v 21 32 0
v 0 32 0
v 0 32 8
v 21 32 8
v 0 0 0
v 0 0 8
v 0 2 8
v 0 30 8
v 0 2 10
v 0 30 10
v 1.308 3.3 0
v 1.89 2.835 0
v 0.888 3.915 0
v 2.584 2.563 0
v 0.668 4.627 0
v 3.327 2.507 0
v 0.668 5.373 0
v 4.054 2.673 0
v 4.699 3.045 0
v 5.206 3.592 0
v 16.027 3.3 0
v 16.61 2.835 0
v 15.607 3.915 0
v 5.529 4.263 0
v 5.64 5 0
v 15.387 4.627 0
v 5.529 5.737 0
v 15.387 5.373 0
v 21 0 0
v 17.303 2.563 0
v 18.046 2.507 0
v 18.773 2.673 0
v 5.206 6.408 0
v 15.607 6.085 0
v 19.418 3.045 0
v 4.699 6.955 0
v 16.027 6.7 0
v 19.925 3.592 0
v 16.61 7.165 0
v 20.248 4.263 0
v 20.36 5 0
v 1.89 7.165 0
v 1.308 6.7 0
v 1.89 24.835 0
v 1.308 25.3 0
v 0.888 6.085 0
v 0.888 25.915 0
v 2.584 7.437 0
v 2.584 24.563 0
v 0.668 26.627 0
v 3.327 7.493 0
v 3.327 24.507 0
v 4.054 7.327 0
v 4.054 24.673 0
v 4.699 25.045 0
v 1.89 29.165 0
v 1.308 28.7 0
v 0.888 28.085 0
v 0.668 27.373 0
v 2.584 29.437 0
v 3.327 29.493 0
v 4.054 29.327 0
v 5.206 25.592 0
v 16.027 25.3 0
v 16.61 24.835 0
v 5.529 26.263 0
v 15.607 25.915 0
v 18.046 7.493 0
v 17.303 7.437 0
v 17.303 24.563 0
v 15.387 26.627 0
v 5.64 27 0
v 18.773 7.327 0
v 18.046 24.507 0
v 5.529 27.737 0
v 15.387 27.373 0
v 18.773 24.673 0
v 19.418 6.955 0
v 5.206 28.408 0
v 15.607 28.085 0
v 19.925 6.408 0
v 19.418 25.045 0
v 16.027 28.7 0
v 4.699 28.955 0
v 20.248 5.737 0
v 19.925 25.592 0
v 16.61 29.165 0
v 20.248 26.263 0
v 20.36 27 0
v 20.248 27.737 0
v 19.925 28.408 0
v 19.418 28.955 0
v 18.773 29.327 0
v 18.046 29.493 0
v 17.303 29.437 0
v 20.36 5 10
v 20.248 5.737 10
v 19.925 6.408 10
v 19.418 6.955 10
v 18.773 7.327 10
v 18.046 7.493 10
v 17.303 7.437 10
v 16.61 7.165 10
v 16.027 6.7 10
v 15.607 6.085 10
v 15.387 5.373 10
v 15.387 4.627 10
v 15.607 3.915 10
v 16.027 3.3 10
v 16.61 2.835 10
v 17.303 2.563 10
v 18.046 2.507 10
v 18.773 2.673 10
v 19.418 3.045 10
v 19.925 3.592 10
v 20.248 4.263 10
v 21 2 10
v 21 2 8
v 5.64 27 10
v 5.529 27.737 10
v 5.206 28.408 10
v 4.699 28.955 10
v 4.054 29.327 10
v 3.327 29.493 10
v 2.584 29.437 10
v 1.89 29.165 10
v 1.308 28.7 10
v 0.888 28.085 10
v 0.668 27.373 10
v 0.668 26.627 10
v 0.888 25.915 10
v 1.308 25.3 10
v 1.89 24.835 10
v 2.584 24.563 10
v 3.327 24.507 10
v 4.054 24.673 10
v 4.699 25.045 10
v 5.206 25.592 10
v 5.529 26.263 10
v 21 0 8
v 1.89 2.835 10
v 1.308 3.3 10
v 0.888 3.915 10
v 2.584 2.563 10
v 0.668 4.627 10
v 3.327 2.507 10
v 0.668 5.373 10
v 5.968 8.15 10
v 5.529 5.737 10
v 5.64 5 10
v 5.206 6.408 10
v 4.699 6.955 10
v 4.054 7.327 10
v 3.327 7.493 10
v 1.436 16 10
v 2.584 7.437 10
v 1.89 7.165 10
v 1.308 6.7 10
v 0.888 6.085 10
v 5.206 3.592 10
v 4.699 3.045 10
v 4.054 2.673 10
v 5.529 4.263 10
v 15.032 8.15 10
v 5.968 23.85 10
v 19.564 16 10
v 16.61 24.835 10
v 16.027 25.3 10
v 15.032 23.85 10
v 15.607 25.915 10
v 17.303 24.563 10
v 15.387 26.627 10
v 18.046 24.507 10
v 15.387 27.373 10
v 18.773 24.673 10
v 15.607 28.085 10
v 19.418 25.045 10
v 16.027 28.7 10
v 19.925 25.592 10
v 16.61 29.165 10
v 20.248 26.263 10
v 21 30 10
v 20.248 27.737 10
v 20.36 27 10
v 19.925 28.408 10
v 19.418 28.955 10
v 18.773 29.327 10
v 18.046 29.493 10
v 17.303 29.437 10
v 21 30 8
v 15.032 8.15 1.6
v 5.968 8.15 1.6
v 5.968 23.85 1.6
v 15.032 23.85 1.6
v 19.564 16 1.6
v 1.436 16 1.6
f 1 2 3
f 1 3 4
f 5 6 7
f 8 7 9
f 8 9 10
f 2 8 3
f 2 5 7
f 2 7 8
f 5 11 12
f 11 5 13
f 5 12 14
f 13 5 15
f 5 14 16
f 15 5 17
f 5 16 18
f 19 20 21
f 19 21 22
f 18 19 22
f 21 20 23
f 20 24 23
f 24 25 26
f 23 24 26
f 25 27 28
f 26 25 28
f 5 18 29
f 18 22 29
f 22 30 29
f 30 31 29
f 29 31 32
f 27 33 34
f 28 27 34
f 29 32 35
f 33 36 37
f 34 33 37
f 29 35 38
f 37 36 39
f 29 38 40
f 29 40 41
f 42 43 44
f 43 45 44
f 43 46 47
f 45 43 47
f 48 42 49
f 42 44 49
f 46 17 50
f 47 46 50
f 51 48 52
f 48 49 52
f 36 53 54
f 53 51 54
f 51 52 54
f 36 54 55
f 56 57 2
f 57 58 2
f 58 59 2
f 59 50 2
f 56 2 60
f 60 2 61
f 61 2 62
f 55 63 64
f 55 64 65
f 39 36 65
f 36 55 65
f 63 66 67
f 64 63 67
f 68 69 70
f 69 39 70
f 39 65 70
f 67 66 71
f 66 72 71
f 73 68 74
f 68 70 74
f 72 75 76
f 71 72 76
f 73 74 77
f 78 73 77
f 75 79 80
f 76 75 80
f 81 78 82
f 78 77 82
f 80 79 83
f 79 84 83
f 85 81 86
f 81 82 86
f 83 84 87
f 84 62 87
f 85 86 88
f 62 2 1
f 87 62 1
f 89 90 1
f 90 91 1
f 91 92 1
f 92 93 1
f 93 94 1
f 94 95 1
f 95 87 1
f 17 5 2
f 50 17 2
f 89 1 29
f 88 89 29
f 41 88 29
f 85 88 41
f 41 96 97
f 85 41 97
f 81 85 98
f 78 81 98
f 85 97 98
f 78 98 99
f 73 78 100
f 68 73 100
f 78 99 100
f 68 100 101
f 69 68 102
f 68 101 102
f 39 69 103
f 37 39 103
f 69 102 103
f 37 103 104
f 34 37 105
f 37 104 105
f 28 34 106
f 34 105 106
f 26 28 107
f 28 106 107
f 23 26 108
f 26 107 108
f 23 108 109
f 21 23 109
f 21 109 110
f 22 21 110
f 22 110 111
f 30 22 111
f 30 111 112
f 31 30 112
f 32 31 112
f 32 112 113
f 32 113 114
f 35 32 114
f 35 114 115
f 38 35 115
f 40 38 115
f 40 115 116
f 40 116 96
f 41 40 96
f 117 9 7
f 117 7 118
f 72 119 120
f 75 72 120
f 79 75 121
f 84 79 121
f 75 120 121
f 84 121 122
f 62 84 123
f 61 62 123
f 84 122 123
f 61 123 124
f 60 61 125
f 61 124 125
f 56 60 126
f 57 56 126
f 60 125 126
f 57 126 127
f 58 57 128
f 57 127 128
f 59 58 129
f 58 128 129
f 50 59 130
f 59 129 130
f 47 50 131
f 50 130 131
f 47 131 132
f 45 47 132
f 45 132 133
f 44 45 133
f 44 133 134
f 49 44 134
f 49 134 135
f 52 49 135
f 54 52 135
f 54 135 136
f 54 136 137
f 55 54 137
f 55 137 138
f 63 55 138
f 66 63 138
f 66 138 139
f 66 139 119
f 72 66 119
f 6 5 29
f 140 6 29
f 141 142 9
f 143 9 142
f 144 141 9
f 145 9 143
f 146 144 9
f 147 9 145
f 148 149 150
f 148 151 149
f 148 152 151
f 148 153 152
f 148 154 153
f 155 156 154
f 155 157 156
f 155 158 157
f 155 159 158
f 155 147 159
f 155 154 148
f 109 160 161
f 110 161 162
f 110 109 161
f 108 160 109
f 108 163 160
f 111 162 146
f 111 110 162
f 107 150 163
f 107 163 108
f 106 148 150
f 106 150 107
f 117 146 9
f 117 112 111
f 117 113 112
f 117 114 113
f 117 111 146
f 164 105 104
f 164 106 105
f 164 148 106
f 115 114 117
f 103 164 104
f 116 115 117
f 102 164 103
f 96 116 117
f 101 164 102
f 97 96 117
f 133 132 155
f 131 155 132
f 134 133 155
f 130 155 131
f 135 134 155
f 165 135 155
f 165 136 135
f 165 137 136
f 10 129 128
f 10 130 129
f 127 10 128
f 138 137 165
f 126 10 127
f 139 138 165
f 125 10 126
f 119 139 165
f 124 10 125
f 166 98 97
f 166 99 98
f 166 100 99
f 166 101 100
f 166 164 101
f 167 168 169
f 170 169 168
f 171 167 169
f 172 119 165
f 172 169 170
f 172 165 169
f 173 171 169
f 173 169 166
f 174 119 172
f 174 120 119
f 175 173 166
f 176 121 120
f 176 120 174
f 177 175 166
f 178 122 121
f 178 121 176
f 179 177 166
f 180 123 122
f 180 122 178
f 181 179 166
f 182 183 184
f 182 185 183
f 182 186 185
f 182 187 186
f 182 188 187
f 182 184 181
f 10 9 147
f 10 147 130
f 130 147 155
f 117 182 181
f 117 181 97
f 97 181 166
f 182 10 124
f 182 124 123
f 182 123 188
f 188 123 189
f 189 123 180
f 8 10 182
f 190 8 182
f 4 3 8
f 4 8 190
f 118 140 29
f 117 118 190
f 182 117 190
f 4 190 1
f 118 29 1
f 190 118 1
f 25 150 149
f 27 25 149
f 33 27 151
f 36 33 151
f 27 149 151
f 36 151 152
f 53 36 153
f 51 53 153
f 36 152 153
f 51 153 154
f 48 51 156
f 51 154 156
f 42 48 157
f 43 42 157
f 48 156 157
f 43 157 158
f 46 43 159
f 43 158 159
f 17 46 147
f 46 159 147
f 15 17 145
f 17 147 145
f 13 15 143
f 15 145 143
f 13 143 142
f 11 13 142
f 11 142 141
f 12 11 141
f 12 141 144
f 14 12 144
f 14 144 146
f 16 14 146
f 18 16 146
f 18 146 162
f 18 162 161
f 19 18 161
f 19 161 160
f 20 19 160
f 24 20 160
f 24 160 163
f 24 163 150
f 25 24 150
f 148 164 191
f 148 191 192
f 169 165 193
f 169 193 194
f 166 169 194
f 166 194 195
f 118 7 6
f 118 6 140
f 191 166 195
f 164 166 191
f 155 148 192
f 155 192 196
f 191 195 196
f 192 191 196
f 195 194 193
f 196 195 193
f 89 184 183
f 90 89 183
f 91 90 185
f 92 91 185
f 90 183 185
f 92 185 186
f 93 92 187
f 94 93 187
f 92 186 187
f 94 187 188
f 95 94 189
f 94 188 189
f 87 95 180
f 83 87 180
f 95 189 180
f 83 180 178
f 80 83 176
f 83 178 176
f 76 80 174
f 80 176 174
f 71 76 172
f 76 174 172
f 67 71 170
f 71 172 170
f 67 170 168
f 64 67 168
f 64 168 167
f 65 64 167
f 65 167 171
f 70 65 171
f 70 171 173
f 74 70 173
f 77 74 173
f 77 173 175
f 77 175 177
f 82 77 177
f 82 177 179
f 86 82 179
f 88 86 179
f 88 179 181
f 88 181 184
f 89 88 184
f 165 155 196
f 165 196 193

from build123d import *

# Parameters (mm, degrees)
BOX_W           = 21
BOX_H           = 32
BOX_DEPTH       = 10
POCKET_DEPTH    = 8.4
SKETCH002_W     = 21
SKETCH002_H     = 2
POCKET001_DEPTH = 2
SKETCH001_R     = 2.5
POCKET002_DEPTH = 10.001


with BuildPart() as part:
    # Box → Box (new body)
    with BuildSketch(Plane.XY):
        with Locations((10.5, 16)):
            Rectangle(BOX_W, BOX_H)
    extrude(amount=BOX_DEPTH)

    # Sketch → Pocket (cut)
    with BuildSketch(Plane.XY.offset(10)):
        Polygon((1.435601, 16), (5.9678, 23.850001), (15.0322, 23.850001), (19.564399, 16), (15.0322, 8.149999), (5.9678, 8.149999), align=None)
    extrude(amount=-POCKET_DEPTH, mode=Mode.SUBTRACT)

    # Sketch002 → Pocket001 (cut)
    with BuildSketch(Plane.XY.offset(10)):
        with Locations((10.5, 31)):
            Rectangle(SKETCH002_W, SKETCH002_H)
        with Locations((10.5, 1)):
            Rectangle(SKETCH002_W, SKETCH002_H)
    extrude(amount=-POCKET001_DEPTH, mode=Mode.SUBTRACT)

    # Sketch001 → Pocket002 (cut, through all)
    with BuildSketch(Plane.XY.offset(10)):
        with Locations((3.140495, 27)):
            Circle(SKETCH001_R)
        with Locations((17.859505, 27)):
            Circle(SKETCH001_R)
        with Locations((3.140495, 5)):
            Circle(SKETCH001_R)
        with Locations((17.859505, 5)):
            Circle(SKETCH001_R)
    extrude(amount=-POCKET002_DEPTH, mode=Mode.SUBTRACT)


solid = part.part
